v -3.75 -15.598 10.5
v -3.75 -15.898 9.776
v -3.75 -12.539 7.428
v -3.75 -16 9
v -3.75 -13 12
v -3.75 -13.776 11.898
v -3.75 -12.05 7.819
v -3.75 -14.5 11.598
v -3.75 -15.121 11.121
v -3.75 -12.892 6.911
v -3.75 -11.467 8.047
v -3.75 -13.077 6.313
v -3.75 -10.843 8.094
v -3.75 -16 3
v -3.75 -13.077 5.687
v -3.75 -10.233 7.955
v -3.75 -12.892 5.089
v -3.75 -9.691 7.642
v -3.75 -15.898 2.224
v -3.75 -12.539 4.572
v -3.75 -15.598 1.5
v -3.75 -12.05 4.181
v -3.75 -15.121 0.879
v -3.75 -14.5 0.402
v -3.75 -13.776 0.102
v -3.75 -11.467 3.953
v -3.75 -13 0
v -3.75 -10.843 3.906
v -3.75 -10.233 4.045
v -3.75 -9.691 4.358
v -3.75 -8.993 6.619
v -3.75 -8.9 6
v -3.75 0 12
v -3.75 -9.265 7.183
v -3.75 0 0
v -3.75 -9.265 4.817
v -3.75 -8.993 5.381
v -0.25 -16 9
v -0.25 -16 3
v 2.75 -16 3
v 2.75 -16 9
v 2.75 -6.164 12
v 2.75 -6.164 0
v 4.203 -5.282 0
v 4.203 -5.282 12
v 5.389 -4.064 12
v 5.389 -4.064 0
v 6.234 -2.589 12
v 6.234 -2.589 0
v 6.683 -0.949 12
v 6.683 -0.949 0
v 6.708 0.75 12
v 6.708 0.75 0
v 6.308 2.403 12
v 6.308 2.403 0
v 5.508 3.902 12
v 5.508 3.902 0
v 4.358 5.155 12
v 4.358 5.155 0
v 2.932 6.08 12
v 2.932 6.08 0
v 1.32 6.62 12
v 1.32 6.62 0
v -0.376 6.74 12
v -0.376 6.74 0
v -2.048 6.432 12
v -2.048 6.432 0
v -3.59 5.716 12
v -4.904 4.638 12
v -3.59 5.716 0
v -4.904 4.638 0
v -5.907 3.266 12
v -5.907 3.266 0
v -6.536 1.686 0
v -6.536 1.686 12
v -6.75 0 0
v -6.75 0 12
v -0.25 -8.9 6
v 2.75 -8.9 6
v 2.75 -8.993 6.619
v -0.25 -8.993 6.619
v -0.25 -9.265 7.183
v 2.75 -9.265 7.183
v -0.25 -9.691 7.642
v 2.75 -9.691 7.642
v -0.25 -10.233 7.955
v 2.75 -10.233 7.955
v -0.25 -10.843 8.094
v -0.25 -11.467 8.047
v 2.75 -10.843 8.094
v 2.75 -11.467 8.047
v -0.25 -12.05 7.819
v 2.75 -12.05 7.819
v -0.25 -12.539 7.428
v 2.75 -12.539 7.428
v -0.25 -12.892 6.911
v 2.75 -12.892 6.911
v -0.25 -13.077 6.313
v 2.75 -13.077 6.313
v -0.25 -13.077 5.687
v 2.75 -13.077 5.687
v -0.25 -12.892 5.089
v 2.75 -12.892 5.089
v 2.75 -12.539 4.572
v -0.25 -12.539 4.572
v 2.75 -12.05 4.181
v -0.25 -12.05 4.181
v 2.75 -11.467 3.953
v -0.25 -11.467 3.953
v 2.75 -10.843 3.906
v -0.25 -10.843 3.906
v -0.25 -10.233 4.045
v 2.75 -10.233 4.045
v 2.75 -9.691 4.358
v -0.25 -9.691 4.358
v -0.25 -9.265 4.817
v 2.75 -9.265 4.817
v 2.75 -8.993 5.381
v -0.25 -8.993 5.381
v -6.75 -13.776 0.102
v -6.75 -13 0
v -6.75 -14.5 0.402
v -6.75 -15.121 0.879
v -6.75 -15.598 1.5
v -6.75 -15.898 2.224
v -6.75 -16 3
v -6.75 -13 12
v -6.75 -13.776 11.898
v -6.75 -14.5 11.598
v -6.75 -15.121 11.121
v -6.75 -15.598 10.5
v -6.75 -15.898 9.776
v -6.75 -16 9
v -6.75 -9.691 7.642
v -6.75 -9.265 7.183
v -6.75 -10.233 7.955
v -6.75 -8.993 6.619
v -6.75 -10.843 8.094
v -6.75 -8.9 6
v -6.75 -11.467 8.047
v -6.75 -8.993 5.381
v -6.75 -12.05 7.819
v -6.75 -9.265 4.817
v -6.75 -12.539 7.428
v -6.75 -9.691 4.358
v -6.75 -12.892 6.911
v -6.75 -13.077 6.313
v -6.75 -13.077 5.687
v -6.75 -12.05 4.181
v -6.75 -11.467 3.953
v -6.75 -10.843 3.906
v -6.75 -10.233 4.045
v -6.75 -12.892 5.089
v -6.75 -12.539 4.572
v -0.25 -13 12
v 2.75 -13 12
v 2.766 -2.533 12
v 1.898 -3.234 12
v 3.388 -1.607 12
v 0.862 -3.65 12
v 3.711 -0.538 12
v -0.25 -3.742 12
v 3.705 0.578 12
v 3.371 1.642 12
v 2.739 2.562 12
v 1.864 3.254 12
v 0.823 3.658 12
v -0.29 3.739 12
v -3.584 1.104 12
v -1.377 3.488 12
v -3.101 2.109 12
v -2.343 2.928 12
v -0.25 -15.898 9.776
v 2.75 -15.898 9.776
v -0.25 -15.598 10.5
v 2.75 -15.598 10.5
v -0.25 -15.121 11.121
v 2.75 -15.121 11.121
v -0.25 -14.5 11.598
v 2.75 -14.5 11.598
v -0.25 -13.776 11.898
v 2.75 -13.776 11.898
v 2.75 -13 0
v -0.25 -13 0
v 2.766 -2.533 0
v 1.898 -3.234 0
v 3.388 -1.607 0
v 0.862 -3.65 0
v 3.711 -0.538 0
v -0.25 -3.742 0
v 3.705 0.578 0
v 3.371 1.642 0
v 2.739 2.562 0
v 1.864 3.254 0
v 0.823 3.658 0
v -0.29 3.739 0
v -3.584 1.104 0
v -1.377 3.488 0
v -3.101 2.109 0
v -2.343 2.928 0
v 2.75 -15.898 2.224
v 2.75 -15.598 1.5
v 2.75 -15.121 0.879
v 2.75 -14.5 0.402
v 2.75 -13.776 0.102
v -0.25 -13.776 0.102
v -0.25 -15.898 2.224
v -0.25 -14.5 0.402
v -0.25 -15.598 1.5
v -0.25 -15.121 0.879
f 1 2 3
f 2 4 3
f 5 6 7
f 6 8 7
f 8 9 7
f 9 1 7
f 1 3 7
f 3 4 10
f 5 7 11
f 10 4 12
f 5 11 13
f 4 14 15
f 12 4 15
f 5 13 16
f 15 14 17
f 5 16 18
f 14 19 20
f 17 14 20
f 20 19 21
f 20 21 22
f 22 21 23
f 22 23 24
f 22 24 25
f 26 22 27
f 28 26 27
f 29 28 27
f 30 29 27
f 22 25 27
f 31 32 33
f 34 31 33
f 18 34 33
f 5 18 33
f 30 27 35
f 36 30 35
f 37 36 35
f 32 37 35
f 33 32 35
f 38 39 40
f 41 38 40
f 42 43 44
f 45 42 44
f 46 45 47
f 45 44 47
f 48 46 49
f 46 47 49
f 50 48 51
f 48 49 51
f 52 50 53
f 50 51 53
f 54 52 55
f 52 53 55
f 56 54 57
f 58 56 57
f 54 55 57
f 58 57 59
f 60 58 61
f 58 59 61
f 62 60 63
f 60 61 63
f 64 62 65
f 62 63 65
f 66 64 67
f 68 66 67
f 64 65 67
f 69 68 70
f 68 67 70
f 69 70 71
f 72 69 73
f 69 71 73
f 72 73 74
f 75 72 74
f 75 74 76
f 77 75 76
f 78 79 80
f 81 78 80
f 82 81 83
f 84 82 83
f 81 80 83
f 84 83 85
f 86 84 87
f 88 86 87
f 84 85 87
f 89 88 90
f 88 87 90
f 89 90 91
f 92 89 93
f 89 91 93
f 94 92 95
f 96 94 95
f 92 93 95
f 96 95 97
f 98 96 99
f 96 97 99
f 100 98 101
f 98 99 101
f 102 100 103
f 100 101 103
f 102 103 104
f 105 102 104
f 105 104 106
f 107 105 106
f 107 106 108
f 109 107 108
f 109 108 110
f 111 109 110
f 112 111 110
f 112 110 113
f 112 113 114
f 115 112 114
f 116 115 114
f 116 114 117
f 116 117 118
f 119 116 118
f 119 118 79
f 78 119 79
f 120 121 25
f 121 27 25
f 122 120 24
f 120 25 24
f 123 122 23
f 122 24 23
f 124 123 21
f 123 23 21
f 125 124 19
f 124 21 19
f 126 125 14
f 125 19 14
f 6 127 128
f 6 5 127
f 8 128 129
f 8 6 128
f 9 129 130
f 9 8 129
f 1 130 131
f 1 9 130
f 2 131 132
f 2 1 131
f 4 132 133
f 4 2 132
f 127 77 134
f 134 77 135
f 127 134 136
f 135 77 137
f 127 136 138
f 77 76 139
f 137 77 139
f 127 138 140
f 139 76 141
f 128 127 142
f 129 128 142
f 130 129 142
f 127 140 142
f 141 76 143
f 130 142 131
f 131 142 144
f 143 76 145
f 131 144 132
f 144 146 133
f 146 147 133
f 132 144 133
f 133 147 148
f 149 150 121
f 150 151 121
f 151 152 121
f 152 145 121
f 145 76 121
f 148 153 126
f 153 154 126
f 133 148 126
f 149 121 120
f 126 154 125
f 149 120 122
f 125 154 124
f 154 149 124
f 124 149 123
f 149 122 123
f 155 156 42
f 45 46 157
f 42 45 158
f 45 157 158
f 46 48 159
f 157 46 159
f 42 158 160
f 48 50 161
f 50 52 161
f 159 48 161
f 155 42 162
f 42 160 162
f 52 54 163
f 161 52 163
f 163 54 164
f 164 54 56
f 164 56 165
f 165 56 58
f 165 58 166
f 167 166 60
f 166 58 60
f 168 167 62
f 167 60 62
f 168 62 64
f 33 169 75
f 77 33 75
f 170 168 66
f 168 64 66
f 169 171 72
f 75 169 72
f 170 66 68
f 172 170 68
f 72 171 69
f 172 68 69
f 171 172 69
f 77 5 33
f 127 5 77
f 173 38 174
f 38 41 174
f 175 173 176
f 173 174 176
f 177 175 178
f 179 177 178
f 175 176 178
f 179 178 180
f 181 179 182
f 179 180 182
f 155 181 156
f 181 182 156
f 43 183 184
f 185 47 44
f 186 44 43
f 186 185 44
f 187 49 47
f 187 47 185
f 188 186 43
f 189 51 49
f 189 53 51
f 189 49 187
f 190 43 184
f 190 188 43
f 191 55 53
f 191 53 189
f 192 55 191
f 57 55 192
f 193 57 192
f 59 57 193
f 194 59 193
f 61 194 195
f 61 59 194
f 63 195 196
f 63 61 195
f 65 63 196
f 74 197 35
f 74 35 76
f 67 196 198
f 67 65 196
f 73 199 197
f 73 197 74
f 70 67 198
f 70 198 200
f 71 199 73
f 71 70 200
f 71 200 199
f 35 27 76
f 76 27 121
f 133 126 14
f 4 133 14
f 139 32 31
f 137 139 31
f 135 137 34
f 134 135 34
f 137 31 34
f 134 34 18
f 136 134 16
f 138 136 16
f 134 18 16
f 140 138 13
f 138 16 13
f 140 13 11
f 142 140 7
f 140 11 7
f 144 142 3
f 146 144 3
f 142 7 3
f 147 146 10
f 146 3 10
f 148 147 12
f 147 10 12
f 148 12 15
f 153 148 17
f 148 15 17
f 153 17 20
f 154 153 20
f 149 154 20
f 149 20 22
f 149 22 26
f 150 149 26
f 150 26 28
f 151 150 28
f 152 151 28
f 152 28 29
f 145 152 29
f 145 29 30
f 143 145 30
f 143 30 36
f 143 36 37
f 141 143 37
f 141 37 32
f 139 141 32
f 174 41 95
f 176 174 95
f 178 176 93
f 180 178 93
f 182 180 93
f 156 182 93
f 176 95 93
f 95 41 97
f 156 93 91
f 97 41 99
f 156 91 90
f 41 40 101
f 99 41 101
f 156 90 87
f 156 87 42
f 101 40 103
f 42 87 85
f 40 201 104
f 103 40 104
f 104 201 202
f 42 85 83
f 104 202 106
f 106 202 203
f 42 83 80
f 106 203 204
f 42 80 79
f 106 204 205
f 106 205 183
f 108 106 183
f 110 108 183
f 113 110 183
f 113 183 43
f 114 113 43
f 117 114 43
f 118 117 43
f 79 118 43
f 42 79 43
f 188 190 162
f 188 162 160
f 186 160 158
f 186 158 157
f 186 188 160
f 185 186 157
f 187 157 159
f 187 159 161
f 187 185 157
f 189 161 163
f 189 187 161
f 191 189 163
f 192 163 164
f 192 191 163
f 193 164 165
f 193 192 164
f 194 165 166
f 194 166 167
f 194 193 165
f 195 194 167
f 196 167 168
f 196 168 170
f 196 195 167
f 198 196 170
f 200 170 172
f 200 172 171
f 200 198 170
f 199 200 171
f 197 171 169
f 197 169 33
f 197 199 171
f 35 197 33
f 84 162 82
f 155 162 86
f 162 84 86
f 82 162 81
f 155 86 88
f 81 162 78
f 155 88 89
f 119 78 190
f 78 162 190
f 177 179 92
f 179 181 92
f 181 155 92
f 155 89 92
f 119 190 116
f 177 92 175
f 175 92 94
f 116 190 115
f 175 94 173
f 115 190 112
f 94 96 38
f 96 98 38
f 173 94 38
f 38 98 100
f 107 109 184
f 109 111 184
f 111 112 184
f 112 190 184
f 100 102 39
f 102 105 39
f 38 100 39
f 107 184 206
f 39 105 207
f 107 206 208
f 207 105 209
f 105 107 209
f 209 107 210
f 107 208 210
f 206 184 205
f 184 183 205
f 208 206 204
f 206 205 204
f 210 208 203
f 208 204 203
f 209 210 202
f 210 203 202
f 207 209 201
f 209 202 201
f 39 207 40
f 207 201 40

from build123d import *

# Parameters (mm, degrees)
PAD_DEPTH    = 12
SKETCH001_R  = 2.1
POCKET_DEPTH = 9.501
FILLET_R     = 3
FILLET001_R  = 3


with BuildPart() as part:
    # Sketch → Pad (new body)
    with BuildSketch(Plane.XY):
        with BuildLine():
            ThreePointArc((-0.25, -3.741657), (2.738613, 2.561738), (-3.75, 0))
            Line((-3.75, -16), (-3.75, 0))
            Line((-6.75, -16), (-3.75, -16))
            Line((-6.75, 0), (-6.75, -16))
            ThreePointArc((2.75, -6.164414), (3.674235, 5.662376), (-6.75, 0))
            Line((2.75, -16), (2.75, -6.164414))
            Line((-0.25, -16), (2.75, -16))
            Line((-0.25, -3.741657), (-0.25, -16))
        make_face()
    extrude(amount=PAD_DEPTH)

    # Sketch001 → Pocket (cut, through all)
    with BuildSketch(Plane.YZ.offset(2.75)):
        with Locations((-11, 6)):
            Circle(SKETCH001_R)
    extrude(amount=-POCKET_DEPTH, mode=Mode.SUBTRACT)

    # Fillet
    fillet_edges = [part.edges().sort_by_distance(p)[0] for p in [
        (1.25, -16, 0),
        (-5.25, -16, 0),
    ]]
    fillet(fillet_edges, radius=FILLET_R)

    # Fillet001
    fillet001_edges = [part.edges().sort_by_distance(p)[0] for p in [
        (-5.25, -16, 12),
        (1.25, -16, 12),
    ]]
    fillet(fillet001_edges, radius=FILLET001_R)


solid = part.part
